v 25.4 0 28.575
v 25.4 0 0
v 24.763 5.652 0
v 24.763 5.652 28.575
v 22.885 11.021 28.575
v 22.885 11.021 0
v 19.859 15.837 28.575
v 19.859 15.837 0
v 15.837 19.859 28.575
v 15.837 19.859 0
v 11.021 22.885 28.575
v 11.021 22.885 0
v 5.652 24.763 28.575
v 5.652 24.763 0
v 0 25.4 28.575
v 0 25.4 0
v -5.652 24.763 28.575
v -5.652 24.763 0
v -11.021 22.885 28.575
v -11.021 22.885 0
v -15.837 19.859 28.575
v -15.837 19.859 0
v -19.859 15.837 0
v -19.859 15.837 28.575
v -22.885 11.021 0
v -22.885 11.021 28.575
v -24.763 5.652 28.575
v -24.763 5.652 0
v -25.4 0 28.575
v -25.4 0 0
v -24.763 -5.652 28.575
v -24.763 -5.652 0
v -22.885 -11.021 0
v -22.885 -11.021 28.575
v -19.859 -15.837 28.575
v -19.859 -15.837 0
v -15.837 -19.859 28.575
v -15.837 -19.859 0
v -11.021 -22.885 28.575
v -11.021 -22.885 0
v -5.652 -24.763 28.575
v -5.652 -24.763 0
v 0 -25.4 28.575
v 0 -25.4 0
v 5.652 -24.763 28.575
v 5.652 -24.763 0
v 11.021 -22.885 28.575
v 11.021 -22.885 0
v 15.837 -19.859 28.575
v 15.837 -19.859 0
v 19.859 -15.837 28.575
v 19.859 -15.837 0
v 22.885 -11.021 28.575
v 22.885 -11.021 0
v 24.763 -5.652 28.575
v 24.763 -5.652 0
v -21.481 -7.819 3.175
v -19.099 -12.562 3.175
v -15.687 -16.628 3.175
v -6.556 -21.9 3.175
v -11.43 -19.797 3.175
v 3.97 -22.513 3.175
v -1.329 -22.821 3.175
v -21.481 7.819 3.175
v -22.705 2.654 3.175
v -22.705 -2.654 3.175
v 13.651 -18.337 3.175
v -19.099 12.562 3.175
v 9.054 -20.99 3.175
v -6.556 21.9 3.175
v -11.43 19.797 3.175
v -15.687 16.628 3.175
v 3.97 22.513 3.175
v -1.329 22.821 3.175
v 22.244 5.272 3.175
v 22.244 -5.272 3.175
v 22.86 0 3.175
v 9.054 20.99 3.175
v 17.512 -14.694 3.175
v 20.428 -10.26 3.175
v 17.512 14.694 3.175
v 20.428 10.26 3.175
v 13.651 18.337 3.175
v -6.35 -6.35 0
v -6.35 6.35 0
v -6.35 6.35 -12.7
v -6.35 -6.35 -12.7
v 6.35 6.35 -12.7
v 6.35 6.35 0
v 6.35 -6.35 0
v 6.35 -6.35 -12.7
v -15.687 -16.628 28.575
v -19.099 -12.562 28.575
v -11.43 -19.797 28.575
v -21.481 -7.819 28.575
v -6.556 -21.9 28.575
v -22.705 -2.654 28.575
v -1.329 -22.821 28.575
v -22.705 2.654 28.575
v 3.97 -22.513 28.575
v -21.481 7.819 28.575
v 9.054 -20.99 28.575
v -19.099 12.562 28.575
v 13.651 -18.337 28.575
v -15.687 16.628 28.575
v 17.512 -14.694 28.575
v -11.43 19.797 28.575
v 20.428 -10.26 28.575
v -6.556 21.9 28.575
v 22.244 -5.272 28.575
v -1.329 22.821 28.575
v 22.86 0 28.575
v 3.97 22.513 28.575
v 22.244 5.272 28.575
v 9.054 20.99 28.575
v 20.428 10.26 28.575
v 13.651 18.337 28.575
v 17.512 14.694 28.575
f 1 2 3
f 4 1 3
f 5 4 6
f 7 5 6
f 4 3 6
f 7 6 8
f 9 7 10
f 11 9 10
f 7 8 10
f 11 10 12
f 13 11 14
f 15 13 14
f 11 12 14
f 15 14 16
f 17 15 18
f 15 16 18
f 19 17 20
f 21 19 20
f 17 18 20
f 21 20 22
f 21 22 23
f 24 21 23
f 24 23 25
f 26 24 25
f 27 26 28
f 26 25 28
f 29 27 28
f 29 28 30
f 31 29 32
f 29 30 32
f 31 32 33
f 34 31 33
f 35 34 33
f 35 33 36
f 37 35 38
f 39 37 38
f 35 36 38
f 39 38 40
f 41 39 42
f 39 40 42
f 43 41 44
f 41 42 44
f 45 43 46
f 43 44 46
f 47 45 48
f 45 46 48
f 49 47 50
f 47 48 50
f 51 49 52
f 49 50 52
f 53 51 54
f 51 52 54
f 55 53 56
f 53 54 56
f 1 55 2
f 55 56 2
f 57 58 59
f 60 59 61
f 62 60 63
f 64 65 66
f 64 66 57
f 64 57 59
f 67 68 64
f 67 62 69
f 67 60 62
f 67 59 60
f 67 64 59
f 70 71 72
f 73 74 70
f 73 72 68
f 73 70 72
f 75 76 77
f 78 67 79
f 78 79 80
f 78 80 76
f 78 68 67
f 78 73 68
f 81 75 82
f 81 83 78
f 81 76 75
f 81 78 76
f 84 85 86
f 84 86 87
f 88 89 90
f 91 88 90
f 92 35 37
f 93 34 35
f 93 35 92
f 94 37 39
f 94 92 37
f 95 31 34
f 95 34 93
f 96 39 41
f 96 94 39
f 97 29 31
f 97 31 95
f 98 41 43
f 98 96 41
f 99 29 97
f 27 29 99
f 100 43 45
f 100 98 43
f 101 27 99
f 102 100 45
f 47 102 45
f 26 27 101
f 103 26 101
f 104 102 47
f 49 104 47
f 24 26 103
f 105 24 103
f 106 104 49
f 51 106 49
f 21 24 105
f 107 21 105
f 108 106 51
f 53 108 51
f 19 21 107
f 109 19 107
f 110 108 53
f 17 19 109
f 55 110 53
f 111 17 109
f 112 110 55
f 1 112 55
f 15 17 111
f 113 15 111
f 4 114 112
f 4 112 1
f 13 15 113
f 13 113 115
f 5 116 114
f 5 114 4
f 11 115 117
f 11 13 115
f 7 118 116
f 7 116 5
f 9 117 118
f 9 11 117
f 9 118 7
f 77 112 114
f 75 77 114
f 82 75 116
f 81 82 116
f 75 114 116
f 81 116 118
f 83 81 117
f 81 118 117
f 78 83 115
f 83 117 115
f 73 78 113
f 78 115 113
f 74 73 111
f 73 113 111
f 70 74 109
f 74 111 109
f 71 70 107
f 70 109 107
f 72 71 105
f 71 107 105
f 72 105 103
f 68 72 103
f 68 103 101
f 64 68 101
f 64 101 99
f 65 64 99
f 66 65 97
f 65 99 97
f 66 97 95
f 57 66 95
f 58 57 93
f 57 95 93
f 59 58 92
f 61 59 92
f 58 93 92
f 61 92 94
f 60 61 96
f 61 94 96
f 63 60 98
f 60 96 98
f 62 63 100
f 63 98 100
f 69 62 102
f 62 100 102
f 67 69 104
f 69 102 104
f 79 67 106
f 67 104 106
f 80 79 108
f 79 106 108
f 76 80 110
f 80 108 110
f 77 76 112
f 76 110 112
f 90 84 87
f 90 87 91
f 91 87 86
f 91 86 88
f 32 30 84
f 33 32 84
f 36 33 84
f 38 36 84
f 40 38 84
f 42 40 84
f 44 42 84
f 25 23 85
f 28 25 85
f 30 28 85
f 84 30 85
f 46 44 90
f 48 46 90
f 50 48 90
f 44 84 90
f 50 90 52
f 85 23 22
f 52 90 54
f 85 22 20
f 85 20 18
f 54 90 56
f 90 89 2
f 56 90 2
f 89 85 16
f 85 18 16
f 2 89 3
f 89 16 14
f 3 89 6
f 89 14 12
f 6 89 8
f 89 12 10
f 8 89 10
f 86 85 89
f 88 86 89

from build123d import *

# Parameters (mm, degrees)
F0_R     = 25.4
F1_DEPTH = 28.575
F2_R     = 22.86
F3_DEPTH = 25.4
F4_W     = 12.7
F4_H     = 12.7
F5_DEPTH = 12.7


with BuildPart() as f1:
    # F0 (on Top) → F1 (new body)
    with BuildSketch(Plane.XY):
        Circle(F0_R)
    extrude(amount=F1_DEPTH)

    # F2 (on face) → F3 (cut)
    with BuildSketch(Plane.XY.offset(28.575)):
        Circle(F2_R)
    extrude(amount=-F3_DEPTH, mode=Mode.SUBTRACT)

    # F4 (on face) → F5 (join)
    with BuildSketch(Plane(origin=(0, 0, 0), x_dir=(1, 0, 0), z_dir=(0, 0, -1))):
        Rectangle(F4_W, F4_H)
    extrude(amount=F5_DEPTH)


solid = f1.part
